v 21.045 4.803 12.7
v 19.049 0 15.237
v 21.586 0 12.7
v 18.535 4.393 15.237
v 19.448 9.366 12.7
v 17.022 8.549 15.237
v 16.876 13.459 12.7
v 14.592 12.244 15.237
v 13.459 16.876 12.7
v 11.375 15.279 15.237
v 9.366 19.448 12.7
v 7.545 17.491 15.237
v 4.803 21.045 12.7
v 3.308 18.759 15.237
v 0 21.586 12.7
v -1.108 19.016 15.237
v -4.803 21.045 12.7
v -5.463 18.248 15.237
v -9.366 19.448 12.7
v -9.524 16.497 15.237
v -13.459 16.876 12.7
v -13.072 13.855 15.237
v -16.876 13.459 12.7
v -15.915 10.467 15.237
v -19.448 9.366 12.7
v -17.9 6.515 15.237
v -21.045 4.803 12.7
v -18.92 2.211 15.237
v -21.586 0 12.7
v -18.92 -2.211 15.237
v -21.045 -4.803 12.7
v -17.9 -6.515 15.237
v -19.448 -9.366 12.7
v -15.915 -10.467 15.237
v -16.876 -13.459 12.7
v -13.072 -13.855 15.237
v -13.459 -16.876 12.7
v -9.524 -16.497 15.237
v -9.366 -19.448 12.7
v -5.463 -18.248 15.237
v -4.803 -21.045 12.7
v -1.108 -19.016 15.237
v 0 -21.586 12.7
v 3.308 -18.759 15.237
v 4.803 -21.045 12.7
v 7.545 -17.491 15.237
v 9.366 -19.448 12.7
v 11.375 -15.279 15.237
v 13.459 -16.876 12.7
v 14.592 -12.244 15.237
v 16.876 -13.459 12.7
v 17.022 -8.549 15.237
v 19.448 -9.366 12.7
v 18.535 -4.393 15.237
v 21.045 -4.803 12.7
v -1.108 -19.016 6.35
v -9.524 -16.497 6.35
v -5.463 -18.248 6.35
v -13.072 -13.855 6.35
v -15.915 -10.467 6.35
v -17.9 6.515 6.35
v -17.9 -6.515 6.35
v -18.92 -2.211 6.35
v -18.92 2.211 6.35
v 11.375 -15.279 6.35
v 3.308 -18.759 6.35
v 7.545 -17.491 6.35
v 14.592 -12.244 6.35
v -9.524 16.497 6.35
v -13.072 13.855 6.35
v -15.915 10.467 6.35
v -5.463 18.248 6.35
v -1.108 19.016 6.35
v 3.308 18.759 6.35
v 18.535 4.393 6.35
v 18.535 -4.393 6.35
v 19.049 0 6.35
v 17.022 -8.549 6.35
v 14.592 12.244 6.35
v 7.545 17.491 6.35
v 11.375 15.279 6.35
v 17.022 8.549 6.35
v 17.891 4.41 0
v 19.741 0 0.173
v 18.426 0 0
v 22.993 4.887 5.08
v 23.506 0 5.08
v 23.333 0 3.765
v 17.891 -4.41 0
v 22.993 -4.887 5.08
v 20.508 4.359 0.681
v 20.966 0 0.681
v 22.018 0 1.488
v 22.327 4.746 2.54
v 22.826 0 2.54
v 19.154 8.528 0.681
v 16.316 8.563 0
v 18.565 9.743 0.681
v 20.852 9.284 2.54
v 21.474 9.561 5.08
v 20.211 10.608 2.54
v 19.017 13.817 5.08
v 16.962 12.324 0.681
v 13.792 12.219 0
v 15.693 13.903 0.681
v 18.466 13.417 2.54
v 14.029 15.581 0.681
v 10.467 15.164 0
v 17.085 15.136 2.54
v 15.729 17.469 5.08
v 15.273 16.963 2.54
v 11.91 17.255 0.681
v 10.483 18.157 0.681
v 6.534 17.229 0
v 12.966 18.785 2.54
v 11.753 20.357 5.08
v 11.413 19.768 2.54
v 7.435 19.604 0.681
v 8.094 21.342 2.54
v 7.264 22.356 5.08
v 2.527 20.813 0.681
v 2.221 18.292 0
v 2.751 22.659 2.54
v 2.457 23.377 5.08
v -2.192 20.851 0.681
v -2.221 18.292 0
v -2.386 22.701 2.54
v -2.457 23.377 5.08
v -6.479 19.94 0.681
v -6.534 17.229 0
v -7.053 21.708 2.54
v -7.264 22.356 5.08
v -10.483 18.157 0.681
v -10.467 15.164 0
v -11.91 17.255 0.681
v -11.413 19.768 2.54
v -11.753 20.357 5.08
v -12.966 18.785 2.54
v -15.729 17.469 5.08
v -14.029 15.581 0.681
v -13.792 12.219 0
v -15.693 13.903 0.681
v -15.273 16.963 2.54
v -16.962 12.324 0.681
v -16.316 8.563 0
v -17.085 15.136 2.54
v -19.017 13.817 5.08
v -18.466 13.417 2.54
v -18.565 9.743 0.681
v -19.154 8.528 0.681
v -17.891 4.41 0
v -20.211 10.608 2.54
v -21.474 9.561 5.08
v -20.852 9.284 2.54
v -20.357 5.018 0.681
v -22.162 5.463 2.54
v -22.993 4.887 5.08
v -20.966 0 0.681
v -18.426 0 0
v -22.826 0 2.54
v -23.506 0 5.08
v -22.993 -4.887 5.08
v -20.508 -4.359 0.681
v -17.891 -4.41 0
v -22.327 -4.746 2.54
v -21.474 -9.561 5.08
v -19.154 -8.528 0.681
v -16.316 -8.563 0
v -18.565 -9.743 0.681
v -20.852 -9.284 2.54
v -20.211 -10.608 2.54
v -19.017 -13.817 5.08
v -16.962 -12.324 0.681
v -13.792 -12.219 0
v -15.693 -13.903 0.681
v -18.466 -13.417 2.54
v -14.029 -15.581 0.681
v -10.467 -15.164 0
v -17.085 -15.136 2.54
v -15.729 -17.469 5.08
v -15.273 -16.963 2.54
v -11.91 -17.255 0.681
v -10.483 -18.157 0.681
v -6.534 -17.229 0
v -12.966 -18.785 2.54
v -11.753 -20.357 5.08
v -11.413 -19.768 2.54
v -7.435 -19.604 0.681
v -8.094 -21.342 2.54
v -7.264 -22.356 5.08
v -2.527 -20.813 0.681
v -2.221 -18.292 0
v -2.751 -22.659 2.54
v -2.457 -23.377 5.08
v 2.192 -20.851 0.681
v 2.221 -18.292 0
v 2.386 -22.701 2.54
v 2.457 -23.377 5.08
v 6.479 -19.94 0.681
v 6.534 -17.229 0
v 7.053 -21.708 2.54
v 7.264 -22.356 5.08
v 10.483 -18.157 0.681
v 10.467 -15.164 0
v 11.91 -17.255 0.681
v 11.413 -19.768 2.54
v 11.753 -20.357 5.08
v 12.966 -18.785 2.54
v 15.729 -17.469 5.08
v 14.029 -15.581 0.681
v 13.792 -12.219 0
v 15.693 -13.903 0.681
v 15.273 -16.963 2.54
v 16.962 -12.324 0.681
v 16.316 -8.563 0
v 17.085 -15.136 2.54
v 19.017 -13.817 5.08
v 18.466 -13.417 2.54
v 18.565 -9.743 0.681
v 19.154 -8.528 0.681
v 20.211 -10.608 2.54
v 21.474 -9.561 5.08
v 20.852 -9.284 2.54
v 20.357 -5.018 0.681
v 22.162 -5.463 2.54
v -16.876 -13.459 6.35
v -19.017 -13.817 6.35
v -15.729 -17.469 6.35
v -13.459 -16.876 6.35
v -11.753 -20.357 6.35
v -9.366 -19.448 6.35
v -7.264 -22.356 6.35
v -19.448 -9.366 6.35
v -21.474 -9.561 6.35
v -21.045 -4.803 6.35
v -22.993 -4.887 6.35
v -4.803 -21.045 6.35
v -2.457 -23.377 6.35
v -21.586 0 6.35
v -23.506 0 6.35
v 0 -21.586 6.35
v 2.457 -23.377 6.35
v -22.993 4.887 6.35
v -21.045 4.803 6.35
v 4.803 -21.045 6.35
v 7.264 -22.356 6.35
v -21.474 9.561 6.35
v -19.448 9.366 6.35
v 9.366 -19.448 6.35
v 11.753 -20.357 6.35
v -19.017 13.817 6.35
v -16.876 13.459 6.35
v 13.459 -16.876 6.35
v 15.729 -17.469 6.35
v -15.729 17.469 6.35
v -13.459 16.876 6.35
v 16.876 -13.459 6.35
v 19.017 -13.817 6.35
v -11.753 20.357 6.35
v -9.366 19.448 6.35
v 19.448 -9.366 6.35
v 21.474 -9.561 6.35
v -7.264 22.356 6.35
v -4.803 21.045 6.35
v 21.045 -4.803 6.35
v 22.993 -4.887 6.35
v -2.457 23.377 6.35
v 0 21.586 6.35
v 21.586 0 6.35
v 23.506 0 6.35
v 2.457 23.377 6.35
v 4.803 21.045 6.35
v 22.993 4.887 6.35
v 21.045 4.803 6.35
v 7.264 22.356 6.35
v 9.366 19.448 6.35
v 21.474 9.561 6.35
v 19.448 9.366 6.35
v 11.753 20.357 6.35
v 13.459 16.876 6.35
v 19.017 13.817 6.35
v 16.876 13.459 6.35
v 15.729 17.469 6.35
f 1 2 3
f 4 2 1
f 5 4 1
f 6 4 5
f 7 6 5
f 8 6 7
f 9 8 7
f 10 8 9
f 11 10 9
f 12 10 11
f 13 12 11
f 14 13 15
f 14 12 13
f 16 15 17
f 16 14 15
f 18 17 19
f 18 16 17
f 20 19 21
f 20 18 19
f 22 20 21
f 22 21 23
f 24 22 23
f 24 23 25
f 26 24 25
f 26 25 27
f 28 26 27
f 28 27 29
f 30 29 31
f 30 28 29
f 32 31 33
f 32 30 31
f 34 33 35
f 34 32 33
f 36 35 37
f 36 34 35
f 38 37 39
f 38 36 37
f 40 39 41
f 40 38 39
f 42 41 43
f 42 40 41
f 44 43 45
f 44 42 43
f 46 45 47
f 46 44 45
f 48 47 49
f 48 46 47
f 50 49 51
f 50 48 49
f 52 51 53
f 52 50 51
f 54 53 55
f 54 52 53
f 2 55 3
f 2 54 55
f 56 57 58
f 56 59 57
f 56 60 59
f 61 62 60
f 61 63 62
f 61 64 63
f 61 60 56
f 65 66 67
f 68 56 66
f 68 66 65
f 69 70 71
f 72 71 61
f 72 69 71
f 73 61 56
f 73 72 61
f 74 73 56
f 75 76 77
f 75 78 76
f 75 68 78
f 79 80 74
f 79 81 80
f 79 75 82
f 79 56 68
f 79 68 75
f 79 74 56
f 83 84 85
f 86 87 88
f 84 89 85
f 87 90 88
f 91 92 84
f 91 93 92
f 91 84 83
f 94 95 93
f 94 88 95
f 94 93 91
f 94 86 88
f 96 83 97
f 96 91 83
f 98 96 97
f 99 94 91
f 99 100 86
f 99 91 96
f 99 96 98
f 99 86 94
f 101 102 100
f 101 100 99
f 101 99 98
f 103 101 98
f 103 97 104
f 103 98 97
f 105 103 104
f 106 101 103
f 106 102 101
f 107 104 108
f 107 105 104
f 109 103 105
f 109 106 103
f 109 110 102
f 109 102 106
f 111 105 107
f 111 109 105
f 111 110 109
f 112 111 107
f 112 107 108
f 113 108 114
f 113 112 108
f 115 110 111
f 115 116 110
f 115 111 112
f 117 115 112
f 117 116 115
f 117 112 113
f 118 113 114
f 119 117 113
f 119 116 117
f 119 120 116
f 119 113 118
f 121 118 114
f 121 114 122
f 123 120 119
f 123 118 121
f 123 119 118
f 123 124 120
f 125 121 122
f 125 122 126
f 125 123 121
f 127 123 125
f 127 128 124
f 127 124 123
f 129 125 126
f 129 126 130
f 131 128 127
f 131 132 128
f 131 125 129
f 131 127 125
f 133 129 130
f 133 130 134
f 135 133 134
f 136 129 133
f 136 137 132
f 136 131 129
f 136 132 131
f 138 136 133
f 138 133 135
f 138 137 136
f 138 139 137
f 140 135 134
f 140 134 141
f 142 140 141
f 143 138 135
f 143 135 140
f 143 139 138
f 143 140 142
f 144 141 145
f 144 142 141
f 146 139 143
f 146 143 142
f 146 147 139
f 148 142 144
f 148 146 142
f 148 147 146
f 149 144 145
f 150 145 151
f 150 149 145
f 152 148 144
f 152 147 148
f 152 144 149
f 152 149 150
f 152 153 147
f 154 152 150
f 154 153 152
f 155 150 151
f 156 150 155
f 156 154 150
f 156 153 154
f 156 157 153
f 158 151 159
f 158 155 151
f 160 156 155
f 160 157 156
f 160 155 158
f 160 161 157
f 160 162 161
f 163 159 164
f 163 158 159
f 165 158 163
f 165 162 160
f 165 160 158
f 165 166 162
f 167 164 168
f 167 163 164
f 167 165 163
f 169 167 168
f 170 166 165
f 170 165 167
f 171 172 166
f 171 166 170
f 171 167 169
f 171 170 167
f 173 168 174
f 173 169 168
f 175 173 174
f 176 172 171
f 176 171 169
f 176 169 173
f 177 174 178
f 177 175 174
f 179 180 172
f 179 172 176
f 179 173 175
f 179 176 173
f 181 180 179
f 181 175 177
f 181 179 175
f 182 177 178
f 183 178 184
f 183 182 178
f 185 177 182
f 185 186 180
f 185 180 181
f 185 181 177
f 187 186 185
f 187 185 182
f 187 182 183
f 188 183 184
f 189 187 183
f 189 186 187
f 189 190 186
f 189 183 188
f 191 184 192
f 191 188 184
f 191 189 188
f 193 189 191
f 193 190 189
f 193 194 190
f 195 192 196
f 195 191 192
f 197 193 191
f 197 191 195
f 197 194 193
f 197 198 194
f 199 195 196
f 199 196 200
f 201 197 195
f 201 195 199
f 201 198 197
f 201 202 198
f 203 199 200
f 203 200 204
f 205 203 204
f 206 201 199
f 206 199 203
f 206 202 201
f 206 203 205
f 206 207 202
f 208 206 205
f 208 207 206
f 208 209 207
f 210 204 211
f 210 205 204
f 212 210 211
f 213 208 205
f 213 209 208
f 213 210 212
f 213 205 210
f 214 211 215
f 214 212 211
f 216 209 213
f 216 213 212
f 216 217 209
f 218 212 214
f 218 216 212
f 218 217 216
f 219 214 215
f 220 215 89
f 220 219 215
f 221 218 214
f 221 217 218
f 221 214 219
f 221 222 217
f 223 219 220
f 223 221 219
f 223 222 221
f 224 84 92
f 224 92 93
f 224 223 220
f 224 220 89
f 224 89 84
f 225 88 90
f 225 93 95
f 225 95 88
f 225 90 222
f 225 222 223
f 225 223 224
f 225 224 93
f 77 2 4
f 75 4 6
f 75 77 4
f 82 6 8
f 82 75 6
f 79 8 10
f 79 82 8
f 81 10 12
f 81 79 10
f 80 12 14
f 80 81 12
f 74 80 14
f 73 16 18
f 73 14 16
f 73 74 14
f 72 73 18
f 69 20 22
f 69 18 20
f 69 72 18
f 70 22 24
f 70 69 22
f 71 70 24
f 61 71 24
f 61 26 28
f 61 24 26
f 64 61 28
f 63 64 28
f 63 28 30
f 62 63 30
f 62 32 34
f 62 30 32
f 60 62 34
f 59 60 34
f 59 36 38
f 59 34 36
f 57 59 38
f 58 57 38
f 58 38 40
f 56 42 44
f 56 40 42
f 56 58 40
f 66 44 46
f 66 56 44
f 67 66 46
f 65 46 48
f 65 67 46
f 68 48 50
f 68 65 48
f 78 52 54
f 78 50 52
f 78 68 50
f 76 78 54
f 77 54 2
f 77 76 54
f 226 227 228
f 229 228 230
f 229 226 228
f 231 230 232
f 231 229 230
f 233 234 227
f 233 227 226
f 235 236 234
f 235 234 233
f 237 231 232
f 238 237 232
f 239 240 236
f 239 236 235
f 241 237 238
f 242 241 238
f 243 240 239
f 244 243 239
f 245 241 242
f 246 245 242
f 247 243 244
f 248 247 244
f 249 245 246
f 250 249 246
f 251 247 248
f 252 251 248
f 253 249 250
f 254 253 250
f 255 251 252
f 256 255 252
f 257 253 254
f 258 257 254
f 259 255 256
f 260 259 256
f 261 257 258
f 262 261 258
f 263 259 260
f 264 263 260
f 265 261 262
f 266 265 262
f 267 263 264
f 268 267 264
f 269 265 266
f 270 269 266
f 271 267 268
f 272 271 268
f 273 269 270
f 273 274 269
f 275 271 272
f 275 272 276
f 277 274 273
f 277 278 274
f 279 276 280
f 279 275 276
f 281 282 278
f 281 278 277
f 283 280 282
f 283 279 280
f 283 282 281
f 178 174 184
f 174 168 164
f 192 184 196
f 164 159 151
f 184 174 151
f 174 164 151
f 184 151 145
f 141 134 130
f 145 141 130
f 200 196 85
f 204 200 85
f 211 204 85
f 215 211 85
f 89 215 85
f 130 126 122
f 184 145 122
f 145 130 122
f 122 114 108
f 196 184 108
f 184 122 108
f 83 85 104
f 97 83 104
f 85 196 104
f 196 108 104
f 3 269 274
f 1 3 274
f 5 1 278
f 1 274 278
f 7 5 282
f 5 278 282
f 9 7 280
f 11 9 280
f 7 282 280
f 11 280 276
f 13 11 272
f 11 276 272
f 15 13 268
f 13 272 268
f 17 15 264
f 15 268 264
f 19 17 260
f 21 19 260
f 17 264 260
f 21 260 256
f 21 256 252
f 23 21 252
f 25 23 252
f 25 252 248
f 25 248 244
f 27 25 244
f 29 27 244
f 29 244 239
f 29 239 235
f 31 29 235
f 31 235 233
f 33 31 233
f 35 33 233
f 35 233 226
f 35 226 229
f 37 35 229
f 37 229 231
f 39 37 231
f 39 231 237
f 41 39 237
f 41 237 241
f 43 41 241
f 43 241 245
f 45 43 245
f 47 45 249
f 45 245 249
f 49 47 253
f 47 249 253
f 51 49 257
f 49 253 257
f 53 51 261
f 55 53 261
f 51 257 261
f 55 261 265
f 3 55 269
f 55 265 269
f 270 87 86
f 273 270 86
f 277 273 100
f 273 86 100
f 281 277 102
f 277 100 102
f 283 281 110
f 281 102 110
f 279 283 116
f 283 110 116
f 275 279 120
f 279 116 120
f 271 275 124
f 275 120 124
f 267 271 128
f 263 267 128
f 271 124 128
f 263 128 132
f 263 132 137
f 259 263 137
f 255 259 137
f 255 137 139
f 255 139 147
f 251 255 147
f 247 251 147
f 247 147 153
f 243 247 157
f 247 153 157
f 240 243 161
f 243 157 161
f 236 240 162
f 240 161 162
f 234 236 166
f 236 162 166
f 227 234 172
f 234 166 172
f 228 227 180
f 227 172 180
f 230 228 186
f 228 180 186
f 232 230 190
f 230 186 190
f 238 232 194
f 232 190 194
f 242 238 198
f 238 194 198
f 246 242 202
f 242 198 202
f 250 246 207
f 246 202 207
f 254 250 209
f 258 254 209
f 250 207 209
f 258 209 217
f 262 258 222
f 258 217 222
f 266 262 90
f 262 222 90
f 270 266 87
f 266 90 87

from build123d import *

# Parameters (mm, degrees)
F0_R     = 23.5061904225
F1_DEPTH = 6.35
F2_R     = 21.5857863289
F2_R_2   = 19.0486454652
F3_DEPTH = 15.24
F4_R     = 5.08


# Not quite as in the source:
# - a fillet or chamfer that OpenCascade refuses, or shapes differently, is made with other operations: its cross-section is extruded or revolved along the edge and cut away or added


with BuildPart() as f1:
    # F0 (on Top) → F1 (new body)
    with BuildSketch(Plane.XY):
        Circle(F0_R)
    extrude(amount=F1_DEPTH)

    # F2 (on Top) → F3 (join)
    with BuildSketch(Plane.XY):
        Circle(F2_R)
        Circle(F2_R_2, mode=Mode.SUBTRACT)
    extrude(amount=F3_DEPTH)

    # F4
    f4_edges = [f1.edges().sort_by_distance(p)[0] for p in [
        (-23.50619, 0, 0),
    ]]
    fillet(f4_edges, radius=F4_R)

    # F5: chamfer of 2.54 on 1 edges, made by hand

    # F5_s1 → F5_t2 (revolve, cut)
    with BuildSketch(Plane.XZ):
        Polygon((21.5857863289, 12.7), (19.0457863289, 15.24), (21.5857863289, 15.24), align=None)
    revolve(axis=Axis((0, 0, 15.24), (0, 0, 1)), mode=Mode.SUBTRACT)


solid = f1.part
